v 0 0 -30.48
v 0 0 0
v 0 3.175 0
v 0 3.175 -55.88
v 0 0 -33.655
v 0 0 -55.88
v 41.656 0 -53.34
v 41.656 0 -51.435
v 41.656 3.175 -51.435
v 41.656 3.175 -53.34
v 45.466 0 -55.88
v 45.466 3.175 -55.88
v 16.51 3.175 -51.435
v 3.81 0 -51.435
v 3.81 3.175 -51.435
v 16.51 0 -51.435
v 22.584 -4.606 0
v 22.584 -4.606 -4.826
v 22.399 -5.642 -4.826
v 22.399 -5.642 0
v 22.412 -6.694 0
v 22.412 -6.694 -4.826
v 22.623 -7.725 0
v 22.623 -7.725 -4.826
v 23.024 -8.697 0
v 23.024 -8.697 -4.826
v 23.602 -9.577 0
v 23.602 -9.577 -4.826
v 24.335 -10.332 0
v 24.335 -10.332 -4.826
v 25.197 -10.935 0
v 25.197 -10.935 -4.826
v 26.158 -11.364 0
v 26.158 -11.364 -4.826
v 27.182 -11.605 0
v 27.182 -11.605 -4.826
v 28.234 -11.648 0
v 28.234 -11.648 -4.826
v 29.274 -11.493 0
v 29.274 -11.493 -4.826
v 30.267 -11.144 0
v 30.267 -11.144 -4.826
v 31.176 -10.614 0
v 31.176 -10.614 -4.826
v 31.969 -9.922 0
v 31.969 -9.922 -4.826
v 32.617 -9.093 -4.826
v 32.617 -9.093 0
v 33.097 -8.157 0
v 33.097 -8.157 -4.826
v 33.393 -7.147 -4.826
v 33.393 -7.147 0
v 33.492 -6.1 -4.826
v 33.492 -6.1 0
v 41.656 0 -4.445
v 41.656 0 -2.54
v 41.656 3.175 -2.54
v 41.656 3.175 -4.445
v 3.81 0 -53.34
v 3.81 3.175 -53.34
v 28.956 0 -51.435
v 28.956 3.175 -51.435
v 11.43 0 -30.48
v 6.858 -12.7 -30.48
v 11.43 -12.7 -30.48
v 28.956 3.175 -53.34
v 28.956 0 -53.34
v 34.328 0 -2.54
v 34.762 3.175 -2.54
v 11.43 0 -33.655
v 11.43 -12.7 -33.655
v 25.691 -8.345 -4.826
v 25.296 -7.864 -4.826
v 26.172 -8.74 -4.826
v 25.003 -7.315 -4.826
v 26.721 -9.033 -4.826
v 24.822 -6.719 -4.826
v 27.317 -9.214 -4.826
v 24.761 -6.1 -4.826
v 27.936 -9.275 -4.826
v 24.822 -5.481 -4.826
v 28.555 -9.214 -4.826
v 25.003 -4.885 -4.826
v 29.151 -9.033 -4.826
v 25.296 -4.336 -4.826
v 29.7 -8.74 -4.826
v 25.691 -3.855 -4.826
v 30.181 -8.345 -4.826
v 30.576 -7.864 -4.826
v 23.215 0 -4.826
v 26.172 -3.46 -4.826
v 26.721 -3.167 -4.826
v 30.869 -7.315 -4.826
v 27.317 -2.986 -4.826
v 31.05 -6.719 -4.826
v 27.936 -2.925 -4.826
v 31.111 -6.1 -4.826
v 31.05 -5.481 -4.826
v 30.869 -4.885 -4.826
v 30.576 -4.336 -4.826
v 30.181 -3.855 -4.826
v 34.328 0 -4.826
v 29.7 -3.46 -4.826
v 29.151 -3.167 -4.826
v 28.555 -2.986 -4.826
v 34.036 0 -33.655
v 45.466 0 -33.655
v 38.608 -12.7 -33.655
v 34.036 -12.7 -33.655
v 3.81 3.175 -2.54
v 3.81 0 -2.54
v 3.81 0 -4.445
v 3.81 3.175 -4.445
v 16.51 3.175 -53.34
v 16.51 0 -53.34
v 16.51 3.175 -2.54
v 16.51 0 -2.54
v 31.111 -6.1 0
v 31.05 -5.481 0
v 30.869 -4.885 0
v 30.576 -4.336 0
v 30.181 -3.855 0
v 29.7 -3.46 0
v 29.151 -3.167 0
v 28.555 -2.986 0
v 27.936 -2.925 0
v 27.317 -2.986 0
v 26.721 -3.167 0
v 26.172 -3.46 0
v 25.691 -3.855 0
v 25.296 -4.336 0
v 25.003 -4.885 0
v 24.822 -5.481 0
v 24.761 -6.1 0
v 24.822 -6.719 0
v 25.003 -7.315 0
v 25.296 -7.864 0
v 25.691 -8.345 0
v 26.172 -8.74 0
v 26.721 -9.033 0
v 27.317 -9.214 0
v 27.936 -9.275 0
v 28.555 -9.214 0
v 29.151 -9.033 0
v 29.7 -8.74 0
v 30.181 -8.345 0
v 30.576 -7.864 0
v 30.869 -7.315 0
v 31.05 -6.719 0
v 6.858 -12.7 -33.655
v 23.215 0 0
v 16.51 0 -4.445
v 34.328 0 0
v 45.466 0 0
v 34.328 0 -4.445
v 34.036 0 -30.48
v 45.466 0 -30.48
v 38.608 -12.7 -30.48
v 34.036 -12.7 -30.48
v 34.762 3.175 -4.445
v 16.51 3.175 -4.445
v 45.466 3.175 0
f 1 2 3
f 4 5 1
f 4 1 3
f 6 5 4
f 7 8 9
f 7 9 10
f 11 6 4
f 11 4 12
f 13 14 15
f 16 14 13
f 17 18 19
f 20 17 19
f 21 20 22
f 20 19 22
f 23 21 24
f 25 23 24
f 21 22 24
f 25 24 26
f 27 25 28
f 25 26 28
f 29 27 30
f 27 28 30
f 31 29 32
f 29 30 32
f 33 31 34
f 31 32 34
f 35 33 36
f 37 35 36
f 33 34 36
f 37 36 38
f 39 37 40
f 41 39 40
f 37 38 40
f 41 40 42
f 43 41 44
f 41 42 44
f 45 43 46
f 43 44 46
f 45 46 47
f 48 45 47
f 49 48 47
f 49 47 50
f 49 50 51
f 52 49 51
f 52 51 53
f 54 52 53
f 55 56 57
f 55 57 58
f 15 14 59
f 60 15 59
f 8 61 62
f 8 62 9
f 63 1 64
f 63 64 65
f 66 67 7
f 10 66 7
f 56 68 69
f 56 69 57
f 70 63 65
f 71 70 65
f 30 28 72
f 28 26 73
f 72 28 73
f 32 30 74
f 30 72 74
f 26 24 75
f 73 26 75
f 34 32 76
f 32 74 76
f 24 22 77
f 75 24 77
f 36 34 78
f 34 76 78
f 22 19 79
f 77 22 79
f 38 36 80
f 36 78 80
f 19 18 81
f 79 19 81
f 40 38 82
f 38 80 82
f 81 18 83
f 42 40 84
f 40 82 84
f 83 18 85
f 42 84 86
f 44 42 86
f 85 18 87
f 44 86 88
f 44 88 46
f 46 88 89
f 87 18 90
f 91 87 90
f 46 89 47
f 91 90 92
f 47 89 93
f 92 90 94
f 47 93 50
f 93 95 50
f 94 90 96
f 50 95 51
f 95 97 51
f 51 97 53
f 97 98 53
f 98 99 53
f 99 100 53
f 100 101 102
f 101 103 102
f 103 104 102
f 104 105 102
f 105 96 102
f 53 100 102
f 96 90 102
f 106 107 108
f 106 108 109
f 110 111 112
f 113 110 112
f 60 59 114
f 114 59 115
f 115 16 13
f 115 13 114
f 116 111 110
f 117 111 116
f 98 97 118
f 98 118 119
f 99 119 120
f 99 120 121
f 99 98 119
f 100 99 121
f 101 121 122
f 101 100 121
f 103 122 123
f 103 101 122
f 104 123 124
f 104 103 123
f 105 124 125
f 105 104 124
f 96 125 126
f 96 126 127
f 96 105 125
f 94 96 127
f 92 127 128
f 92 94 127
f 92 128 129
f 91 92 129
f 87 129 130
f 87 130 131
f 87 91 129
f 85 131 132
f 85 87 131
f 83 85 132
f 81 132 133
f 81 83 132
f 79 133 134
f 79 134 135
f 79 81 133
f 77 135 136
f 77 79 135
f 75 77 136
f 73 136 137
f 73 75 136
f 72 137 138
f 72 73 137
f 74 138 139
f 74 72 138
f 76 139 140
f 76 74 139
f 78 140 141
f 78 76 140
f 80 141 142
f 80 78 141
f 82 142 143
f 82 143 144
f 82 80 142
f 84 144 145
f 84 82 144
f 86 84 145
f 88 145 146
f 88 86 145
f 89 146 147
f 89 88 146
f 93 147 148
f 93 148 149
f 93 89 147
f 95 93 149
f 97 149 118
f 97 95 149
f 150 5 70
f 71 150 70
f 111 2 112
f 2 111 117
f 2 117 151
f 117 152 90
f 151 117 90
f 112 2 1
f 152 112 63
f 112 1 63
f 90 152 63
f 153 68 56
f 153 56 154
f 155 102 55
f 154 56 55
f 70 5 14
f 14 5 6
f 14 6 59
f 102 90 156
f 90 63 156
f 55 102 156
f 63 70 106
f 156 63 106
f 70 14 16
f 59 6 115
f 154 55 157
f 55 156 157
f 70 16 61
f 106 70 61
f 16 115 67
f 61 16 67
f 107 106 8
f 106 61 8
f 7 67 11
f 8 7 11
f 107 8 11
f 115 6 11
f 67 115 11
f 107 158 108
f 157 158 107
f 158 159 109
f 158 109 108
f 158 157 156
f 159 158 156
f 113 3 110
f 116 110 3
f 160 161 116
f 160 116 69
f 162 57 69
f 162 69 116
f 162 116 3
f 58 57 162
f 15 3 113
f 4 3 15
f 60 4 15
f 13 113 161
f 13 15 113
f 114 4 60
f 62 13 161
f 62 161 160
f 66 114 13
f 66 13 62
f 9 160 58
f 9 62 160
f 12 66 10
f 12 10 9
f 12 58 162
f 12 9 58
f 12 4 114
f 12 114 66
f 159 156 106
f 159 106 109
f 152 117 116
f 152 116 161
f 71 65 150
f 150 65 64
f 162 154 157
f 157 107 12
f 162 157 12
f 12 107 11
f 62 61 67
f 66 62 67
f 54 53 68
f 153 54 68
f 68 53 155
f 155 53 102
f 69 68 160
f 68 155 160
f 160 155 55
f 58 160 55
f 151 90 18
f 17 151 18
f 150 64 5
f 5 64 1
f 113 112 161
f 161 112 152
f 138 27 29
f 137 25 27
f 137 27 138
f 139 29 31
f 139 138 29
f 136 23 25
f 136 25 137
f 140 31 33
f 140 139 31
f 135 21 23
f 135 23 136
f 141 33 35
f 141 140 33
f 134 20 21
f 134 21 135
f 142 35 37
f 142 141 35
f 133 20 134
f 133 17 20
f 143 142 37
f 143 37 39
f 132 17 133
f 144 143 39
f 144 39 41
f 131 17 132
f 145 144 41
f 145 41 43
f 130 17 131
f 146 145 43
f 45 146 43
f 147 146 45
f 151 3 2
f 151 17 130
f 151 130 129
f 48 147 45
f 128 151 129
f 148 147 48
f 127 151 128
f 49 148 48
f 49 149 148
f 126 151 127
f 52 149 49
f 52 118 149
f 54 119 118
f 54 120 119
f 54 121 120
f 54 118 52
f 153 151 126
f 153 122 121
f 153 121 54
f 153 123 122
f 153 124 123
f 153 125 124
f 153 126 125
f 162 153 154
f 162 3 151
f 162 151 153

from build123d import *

# Parameters (mm, degrees)
SKETCH1_W               = 45.466
SKETCH1_H               = 55.88
SKETCH1_W_2             = 12.7
SKETCH1_H_2             = 1.905
BOSS_EXTRUDE1_DEPTH     = 3.175
BOSS_EXTRUDE2_DEPTH     = 3.175
BOSS_EXTRUDE3_START     = -4.826
BOSS_EXTRUDE3_OUTLINE_R = 3.175
BOSS_EXTRUDE3_DEPTH     = 4.826


# Read off the part's stored shape, not the designer's step: Boss-Extrude3
with BuildPart() as part:
    # Sketch1 → Boss-Extrude1 (new body)
    with BuildSketch(Plane(origin=(0, 0, 0), x_dir=(1, 0, 0), z_dir=(0, 1, 0))):
        with Locations((22.733, 27.94)):
            Rectangle(SKETCH1_W, SKETCH1_H)
        with Locations((35.306, 52.3875)):
            Rectangle(SKETCH1_W_2, SKETCH1_H_2, mode=Mode.SUBTRACT)
        with Locations((10.16, 52.3875)):
            Rectangle(SKETCH1_W_2, SKETCH1_H_2, mode=Mode.SUBTRACT)
        with Locations((35.306, 3.4925)):
            Rectangle(SKETCH1_W_2, SKETCH1_H_2, mode=Mode.SUBTRACT)
        with Locations((10.16, 3.4925)):
            Rectangle(SKETCH1_W_2, SKETCH1_H_2, mode=Mode.SUBTRACT)
    extrude(amount=BOSS_EXTRUDE1_DEPTH)

    # 3DSketch2 → Boss-Extrude2 (add)
    with BuildSketch(Plane(origin=(34.036, 0, -30.48), x_dir=(-1, 0, 0), z_dir=(0, 0, 1))):
        Polygon((0, 0), (0, 12.7), (-4.572, 12.7), (-11.43, 0), align=None)
        Polygon((22.606, 0), (22.606, 12.7), (27.178, 12.7), (34.036, 0), align=None)
    extrude(amount=-BOSS_EXTRUDE2_DEPTH)

    # Boss-Extrude3 outline → Boss-Extrude3 (add)
    with BuildSketch(Plane.XY.offset(BOSS_EXTRUDE3_START)):
        with BuildLine():
            Line((23.215006065, 0), (22.584264524, -4.606399832))
            ThreePointArc((22.584264524, -4.606399832), (27.182231525, -11.604883936), (33.49225, -6.1))
            Line((33.49225, -6.1), (34.76225, 3.175))
            Line((34.76225, 3.175), (28.956, 3.175))
            Line((28.956, 3.175), (28.956, 0))
            Line((28.956, 0), (23.215006065, 0))
        make_face()
        with Locations((27.936, -6.1)):
            Circle(BOSS_EXTRUDE3_OUTLINE_R, mode=Mode.SUBTRACT)
    extrude(amount=BOSS_EXTRUDE3_DEPTH)


solid = part.part
